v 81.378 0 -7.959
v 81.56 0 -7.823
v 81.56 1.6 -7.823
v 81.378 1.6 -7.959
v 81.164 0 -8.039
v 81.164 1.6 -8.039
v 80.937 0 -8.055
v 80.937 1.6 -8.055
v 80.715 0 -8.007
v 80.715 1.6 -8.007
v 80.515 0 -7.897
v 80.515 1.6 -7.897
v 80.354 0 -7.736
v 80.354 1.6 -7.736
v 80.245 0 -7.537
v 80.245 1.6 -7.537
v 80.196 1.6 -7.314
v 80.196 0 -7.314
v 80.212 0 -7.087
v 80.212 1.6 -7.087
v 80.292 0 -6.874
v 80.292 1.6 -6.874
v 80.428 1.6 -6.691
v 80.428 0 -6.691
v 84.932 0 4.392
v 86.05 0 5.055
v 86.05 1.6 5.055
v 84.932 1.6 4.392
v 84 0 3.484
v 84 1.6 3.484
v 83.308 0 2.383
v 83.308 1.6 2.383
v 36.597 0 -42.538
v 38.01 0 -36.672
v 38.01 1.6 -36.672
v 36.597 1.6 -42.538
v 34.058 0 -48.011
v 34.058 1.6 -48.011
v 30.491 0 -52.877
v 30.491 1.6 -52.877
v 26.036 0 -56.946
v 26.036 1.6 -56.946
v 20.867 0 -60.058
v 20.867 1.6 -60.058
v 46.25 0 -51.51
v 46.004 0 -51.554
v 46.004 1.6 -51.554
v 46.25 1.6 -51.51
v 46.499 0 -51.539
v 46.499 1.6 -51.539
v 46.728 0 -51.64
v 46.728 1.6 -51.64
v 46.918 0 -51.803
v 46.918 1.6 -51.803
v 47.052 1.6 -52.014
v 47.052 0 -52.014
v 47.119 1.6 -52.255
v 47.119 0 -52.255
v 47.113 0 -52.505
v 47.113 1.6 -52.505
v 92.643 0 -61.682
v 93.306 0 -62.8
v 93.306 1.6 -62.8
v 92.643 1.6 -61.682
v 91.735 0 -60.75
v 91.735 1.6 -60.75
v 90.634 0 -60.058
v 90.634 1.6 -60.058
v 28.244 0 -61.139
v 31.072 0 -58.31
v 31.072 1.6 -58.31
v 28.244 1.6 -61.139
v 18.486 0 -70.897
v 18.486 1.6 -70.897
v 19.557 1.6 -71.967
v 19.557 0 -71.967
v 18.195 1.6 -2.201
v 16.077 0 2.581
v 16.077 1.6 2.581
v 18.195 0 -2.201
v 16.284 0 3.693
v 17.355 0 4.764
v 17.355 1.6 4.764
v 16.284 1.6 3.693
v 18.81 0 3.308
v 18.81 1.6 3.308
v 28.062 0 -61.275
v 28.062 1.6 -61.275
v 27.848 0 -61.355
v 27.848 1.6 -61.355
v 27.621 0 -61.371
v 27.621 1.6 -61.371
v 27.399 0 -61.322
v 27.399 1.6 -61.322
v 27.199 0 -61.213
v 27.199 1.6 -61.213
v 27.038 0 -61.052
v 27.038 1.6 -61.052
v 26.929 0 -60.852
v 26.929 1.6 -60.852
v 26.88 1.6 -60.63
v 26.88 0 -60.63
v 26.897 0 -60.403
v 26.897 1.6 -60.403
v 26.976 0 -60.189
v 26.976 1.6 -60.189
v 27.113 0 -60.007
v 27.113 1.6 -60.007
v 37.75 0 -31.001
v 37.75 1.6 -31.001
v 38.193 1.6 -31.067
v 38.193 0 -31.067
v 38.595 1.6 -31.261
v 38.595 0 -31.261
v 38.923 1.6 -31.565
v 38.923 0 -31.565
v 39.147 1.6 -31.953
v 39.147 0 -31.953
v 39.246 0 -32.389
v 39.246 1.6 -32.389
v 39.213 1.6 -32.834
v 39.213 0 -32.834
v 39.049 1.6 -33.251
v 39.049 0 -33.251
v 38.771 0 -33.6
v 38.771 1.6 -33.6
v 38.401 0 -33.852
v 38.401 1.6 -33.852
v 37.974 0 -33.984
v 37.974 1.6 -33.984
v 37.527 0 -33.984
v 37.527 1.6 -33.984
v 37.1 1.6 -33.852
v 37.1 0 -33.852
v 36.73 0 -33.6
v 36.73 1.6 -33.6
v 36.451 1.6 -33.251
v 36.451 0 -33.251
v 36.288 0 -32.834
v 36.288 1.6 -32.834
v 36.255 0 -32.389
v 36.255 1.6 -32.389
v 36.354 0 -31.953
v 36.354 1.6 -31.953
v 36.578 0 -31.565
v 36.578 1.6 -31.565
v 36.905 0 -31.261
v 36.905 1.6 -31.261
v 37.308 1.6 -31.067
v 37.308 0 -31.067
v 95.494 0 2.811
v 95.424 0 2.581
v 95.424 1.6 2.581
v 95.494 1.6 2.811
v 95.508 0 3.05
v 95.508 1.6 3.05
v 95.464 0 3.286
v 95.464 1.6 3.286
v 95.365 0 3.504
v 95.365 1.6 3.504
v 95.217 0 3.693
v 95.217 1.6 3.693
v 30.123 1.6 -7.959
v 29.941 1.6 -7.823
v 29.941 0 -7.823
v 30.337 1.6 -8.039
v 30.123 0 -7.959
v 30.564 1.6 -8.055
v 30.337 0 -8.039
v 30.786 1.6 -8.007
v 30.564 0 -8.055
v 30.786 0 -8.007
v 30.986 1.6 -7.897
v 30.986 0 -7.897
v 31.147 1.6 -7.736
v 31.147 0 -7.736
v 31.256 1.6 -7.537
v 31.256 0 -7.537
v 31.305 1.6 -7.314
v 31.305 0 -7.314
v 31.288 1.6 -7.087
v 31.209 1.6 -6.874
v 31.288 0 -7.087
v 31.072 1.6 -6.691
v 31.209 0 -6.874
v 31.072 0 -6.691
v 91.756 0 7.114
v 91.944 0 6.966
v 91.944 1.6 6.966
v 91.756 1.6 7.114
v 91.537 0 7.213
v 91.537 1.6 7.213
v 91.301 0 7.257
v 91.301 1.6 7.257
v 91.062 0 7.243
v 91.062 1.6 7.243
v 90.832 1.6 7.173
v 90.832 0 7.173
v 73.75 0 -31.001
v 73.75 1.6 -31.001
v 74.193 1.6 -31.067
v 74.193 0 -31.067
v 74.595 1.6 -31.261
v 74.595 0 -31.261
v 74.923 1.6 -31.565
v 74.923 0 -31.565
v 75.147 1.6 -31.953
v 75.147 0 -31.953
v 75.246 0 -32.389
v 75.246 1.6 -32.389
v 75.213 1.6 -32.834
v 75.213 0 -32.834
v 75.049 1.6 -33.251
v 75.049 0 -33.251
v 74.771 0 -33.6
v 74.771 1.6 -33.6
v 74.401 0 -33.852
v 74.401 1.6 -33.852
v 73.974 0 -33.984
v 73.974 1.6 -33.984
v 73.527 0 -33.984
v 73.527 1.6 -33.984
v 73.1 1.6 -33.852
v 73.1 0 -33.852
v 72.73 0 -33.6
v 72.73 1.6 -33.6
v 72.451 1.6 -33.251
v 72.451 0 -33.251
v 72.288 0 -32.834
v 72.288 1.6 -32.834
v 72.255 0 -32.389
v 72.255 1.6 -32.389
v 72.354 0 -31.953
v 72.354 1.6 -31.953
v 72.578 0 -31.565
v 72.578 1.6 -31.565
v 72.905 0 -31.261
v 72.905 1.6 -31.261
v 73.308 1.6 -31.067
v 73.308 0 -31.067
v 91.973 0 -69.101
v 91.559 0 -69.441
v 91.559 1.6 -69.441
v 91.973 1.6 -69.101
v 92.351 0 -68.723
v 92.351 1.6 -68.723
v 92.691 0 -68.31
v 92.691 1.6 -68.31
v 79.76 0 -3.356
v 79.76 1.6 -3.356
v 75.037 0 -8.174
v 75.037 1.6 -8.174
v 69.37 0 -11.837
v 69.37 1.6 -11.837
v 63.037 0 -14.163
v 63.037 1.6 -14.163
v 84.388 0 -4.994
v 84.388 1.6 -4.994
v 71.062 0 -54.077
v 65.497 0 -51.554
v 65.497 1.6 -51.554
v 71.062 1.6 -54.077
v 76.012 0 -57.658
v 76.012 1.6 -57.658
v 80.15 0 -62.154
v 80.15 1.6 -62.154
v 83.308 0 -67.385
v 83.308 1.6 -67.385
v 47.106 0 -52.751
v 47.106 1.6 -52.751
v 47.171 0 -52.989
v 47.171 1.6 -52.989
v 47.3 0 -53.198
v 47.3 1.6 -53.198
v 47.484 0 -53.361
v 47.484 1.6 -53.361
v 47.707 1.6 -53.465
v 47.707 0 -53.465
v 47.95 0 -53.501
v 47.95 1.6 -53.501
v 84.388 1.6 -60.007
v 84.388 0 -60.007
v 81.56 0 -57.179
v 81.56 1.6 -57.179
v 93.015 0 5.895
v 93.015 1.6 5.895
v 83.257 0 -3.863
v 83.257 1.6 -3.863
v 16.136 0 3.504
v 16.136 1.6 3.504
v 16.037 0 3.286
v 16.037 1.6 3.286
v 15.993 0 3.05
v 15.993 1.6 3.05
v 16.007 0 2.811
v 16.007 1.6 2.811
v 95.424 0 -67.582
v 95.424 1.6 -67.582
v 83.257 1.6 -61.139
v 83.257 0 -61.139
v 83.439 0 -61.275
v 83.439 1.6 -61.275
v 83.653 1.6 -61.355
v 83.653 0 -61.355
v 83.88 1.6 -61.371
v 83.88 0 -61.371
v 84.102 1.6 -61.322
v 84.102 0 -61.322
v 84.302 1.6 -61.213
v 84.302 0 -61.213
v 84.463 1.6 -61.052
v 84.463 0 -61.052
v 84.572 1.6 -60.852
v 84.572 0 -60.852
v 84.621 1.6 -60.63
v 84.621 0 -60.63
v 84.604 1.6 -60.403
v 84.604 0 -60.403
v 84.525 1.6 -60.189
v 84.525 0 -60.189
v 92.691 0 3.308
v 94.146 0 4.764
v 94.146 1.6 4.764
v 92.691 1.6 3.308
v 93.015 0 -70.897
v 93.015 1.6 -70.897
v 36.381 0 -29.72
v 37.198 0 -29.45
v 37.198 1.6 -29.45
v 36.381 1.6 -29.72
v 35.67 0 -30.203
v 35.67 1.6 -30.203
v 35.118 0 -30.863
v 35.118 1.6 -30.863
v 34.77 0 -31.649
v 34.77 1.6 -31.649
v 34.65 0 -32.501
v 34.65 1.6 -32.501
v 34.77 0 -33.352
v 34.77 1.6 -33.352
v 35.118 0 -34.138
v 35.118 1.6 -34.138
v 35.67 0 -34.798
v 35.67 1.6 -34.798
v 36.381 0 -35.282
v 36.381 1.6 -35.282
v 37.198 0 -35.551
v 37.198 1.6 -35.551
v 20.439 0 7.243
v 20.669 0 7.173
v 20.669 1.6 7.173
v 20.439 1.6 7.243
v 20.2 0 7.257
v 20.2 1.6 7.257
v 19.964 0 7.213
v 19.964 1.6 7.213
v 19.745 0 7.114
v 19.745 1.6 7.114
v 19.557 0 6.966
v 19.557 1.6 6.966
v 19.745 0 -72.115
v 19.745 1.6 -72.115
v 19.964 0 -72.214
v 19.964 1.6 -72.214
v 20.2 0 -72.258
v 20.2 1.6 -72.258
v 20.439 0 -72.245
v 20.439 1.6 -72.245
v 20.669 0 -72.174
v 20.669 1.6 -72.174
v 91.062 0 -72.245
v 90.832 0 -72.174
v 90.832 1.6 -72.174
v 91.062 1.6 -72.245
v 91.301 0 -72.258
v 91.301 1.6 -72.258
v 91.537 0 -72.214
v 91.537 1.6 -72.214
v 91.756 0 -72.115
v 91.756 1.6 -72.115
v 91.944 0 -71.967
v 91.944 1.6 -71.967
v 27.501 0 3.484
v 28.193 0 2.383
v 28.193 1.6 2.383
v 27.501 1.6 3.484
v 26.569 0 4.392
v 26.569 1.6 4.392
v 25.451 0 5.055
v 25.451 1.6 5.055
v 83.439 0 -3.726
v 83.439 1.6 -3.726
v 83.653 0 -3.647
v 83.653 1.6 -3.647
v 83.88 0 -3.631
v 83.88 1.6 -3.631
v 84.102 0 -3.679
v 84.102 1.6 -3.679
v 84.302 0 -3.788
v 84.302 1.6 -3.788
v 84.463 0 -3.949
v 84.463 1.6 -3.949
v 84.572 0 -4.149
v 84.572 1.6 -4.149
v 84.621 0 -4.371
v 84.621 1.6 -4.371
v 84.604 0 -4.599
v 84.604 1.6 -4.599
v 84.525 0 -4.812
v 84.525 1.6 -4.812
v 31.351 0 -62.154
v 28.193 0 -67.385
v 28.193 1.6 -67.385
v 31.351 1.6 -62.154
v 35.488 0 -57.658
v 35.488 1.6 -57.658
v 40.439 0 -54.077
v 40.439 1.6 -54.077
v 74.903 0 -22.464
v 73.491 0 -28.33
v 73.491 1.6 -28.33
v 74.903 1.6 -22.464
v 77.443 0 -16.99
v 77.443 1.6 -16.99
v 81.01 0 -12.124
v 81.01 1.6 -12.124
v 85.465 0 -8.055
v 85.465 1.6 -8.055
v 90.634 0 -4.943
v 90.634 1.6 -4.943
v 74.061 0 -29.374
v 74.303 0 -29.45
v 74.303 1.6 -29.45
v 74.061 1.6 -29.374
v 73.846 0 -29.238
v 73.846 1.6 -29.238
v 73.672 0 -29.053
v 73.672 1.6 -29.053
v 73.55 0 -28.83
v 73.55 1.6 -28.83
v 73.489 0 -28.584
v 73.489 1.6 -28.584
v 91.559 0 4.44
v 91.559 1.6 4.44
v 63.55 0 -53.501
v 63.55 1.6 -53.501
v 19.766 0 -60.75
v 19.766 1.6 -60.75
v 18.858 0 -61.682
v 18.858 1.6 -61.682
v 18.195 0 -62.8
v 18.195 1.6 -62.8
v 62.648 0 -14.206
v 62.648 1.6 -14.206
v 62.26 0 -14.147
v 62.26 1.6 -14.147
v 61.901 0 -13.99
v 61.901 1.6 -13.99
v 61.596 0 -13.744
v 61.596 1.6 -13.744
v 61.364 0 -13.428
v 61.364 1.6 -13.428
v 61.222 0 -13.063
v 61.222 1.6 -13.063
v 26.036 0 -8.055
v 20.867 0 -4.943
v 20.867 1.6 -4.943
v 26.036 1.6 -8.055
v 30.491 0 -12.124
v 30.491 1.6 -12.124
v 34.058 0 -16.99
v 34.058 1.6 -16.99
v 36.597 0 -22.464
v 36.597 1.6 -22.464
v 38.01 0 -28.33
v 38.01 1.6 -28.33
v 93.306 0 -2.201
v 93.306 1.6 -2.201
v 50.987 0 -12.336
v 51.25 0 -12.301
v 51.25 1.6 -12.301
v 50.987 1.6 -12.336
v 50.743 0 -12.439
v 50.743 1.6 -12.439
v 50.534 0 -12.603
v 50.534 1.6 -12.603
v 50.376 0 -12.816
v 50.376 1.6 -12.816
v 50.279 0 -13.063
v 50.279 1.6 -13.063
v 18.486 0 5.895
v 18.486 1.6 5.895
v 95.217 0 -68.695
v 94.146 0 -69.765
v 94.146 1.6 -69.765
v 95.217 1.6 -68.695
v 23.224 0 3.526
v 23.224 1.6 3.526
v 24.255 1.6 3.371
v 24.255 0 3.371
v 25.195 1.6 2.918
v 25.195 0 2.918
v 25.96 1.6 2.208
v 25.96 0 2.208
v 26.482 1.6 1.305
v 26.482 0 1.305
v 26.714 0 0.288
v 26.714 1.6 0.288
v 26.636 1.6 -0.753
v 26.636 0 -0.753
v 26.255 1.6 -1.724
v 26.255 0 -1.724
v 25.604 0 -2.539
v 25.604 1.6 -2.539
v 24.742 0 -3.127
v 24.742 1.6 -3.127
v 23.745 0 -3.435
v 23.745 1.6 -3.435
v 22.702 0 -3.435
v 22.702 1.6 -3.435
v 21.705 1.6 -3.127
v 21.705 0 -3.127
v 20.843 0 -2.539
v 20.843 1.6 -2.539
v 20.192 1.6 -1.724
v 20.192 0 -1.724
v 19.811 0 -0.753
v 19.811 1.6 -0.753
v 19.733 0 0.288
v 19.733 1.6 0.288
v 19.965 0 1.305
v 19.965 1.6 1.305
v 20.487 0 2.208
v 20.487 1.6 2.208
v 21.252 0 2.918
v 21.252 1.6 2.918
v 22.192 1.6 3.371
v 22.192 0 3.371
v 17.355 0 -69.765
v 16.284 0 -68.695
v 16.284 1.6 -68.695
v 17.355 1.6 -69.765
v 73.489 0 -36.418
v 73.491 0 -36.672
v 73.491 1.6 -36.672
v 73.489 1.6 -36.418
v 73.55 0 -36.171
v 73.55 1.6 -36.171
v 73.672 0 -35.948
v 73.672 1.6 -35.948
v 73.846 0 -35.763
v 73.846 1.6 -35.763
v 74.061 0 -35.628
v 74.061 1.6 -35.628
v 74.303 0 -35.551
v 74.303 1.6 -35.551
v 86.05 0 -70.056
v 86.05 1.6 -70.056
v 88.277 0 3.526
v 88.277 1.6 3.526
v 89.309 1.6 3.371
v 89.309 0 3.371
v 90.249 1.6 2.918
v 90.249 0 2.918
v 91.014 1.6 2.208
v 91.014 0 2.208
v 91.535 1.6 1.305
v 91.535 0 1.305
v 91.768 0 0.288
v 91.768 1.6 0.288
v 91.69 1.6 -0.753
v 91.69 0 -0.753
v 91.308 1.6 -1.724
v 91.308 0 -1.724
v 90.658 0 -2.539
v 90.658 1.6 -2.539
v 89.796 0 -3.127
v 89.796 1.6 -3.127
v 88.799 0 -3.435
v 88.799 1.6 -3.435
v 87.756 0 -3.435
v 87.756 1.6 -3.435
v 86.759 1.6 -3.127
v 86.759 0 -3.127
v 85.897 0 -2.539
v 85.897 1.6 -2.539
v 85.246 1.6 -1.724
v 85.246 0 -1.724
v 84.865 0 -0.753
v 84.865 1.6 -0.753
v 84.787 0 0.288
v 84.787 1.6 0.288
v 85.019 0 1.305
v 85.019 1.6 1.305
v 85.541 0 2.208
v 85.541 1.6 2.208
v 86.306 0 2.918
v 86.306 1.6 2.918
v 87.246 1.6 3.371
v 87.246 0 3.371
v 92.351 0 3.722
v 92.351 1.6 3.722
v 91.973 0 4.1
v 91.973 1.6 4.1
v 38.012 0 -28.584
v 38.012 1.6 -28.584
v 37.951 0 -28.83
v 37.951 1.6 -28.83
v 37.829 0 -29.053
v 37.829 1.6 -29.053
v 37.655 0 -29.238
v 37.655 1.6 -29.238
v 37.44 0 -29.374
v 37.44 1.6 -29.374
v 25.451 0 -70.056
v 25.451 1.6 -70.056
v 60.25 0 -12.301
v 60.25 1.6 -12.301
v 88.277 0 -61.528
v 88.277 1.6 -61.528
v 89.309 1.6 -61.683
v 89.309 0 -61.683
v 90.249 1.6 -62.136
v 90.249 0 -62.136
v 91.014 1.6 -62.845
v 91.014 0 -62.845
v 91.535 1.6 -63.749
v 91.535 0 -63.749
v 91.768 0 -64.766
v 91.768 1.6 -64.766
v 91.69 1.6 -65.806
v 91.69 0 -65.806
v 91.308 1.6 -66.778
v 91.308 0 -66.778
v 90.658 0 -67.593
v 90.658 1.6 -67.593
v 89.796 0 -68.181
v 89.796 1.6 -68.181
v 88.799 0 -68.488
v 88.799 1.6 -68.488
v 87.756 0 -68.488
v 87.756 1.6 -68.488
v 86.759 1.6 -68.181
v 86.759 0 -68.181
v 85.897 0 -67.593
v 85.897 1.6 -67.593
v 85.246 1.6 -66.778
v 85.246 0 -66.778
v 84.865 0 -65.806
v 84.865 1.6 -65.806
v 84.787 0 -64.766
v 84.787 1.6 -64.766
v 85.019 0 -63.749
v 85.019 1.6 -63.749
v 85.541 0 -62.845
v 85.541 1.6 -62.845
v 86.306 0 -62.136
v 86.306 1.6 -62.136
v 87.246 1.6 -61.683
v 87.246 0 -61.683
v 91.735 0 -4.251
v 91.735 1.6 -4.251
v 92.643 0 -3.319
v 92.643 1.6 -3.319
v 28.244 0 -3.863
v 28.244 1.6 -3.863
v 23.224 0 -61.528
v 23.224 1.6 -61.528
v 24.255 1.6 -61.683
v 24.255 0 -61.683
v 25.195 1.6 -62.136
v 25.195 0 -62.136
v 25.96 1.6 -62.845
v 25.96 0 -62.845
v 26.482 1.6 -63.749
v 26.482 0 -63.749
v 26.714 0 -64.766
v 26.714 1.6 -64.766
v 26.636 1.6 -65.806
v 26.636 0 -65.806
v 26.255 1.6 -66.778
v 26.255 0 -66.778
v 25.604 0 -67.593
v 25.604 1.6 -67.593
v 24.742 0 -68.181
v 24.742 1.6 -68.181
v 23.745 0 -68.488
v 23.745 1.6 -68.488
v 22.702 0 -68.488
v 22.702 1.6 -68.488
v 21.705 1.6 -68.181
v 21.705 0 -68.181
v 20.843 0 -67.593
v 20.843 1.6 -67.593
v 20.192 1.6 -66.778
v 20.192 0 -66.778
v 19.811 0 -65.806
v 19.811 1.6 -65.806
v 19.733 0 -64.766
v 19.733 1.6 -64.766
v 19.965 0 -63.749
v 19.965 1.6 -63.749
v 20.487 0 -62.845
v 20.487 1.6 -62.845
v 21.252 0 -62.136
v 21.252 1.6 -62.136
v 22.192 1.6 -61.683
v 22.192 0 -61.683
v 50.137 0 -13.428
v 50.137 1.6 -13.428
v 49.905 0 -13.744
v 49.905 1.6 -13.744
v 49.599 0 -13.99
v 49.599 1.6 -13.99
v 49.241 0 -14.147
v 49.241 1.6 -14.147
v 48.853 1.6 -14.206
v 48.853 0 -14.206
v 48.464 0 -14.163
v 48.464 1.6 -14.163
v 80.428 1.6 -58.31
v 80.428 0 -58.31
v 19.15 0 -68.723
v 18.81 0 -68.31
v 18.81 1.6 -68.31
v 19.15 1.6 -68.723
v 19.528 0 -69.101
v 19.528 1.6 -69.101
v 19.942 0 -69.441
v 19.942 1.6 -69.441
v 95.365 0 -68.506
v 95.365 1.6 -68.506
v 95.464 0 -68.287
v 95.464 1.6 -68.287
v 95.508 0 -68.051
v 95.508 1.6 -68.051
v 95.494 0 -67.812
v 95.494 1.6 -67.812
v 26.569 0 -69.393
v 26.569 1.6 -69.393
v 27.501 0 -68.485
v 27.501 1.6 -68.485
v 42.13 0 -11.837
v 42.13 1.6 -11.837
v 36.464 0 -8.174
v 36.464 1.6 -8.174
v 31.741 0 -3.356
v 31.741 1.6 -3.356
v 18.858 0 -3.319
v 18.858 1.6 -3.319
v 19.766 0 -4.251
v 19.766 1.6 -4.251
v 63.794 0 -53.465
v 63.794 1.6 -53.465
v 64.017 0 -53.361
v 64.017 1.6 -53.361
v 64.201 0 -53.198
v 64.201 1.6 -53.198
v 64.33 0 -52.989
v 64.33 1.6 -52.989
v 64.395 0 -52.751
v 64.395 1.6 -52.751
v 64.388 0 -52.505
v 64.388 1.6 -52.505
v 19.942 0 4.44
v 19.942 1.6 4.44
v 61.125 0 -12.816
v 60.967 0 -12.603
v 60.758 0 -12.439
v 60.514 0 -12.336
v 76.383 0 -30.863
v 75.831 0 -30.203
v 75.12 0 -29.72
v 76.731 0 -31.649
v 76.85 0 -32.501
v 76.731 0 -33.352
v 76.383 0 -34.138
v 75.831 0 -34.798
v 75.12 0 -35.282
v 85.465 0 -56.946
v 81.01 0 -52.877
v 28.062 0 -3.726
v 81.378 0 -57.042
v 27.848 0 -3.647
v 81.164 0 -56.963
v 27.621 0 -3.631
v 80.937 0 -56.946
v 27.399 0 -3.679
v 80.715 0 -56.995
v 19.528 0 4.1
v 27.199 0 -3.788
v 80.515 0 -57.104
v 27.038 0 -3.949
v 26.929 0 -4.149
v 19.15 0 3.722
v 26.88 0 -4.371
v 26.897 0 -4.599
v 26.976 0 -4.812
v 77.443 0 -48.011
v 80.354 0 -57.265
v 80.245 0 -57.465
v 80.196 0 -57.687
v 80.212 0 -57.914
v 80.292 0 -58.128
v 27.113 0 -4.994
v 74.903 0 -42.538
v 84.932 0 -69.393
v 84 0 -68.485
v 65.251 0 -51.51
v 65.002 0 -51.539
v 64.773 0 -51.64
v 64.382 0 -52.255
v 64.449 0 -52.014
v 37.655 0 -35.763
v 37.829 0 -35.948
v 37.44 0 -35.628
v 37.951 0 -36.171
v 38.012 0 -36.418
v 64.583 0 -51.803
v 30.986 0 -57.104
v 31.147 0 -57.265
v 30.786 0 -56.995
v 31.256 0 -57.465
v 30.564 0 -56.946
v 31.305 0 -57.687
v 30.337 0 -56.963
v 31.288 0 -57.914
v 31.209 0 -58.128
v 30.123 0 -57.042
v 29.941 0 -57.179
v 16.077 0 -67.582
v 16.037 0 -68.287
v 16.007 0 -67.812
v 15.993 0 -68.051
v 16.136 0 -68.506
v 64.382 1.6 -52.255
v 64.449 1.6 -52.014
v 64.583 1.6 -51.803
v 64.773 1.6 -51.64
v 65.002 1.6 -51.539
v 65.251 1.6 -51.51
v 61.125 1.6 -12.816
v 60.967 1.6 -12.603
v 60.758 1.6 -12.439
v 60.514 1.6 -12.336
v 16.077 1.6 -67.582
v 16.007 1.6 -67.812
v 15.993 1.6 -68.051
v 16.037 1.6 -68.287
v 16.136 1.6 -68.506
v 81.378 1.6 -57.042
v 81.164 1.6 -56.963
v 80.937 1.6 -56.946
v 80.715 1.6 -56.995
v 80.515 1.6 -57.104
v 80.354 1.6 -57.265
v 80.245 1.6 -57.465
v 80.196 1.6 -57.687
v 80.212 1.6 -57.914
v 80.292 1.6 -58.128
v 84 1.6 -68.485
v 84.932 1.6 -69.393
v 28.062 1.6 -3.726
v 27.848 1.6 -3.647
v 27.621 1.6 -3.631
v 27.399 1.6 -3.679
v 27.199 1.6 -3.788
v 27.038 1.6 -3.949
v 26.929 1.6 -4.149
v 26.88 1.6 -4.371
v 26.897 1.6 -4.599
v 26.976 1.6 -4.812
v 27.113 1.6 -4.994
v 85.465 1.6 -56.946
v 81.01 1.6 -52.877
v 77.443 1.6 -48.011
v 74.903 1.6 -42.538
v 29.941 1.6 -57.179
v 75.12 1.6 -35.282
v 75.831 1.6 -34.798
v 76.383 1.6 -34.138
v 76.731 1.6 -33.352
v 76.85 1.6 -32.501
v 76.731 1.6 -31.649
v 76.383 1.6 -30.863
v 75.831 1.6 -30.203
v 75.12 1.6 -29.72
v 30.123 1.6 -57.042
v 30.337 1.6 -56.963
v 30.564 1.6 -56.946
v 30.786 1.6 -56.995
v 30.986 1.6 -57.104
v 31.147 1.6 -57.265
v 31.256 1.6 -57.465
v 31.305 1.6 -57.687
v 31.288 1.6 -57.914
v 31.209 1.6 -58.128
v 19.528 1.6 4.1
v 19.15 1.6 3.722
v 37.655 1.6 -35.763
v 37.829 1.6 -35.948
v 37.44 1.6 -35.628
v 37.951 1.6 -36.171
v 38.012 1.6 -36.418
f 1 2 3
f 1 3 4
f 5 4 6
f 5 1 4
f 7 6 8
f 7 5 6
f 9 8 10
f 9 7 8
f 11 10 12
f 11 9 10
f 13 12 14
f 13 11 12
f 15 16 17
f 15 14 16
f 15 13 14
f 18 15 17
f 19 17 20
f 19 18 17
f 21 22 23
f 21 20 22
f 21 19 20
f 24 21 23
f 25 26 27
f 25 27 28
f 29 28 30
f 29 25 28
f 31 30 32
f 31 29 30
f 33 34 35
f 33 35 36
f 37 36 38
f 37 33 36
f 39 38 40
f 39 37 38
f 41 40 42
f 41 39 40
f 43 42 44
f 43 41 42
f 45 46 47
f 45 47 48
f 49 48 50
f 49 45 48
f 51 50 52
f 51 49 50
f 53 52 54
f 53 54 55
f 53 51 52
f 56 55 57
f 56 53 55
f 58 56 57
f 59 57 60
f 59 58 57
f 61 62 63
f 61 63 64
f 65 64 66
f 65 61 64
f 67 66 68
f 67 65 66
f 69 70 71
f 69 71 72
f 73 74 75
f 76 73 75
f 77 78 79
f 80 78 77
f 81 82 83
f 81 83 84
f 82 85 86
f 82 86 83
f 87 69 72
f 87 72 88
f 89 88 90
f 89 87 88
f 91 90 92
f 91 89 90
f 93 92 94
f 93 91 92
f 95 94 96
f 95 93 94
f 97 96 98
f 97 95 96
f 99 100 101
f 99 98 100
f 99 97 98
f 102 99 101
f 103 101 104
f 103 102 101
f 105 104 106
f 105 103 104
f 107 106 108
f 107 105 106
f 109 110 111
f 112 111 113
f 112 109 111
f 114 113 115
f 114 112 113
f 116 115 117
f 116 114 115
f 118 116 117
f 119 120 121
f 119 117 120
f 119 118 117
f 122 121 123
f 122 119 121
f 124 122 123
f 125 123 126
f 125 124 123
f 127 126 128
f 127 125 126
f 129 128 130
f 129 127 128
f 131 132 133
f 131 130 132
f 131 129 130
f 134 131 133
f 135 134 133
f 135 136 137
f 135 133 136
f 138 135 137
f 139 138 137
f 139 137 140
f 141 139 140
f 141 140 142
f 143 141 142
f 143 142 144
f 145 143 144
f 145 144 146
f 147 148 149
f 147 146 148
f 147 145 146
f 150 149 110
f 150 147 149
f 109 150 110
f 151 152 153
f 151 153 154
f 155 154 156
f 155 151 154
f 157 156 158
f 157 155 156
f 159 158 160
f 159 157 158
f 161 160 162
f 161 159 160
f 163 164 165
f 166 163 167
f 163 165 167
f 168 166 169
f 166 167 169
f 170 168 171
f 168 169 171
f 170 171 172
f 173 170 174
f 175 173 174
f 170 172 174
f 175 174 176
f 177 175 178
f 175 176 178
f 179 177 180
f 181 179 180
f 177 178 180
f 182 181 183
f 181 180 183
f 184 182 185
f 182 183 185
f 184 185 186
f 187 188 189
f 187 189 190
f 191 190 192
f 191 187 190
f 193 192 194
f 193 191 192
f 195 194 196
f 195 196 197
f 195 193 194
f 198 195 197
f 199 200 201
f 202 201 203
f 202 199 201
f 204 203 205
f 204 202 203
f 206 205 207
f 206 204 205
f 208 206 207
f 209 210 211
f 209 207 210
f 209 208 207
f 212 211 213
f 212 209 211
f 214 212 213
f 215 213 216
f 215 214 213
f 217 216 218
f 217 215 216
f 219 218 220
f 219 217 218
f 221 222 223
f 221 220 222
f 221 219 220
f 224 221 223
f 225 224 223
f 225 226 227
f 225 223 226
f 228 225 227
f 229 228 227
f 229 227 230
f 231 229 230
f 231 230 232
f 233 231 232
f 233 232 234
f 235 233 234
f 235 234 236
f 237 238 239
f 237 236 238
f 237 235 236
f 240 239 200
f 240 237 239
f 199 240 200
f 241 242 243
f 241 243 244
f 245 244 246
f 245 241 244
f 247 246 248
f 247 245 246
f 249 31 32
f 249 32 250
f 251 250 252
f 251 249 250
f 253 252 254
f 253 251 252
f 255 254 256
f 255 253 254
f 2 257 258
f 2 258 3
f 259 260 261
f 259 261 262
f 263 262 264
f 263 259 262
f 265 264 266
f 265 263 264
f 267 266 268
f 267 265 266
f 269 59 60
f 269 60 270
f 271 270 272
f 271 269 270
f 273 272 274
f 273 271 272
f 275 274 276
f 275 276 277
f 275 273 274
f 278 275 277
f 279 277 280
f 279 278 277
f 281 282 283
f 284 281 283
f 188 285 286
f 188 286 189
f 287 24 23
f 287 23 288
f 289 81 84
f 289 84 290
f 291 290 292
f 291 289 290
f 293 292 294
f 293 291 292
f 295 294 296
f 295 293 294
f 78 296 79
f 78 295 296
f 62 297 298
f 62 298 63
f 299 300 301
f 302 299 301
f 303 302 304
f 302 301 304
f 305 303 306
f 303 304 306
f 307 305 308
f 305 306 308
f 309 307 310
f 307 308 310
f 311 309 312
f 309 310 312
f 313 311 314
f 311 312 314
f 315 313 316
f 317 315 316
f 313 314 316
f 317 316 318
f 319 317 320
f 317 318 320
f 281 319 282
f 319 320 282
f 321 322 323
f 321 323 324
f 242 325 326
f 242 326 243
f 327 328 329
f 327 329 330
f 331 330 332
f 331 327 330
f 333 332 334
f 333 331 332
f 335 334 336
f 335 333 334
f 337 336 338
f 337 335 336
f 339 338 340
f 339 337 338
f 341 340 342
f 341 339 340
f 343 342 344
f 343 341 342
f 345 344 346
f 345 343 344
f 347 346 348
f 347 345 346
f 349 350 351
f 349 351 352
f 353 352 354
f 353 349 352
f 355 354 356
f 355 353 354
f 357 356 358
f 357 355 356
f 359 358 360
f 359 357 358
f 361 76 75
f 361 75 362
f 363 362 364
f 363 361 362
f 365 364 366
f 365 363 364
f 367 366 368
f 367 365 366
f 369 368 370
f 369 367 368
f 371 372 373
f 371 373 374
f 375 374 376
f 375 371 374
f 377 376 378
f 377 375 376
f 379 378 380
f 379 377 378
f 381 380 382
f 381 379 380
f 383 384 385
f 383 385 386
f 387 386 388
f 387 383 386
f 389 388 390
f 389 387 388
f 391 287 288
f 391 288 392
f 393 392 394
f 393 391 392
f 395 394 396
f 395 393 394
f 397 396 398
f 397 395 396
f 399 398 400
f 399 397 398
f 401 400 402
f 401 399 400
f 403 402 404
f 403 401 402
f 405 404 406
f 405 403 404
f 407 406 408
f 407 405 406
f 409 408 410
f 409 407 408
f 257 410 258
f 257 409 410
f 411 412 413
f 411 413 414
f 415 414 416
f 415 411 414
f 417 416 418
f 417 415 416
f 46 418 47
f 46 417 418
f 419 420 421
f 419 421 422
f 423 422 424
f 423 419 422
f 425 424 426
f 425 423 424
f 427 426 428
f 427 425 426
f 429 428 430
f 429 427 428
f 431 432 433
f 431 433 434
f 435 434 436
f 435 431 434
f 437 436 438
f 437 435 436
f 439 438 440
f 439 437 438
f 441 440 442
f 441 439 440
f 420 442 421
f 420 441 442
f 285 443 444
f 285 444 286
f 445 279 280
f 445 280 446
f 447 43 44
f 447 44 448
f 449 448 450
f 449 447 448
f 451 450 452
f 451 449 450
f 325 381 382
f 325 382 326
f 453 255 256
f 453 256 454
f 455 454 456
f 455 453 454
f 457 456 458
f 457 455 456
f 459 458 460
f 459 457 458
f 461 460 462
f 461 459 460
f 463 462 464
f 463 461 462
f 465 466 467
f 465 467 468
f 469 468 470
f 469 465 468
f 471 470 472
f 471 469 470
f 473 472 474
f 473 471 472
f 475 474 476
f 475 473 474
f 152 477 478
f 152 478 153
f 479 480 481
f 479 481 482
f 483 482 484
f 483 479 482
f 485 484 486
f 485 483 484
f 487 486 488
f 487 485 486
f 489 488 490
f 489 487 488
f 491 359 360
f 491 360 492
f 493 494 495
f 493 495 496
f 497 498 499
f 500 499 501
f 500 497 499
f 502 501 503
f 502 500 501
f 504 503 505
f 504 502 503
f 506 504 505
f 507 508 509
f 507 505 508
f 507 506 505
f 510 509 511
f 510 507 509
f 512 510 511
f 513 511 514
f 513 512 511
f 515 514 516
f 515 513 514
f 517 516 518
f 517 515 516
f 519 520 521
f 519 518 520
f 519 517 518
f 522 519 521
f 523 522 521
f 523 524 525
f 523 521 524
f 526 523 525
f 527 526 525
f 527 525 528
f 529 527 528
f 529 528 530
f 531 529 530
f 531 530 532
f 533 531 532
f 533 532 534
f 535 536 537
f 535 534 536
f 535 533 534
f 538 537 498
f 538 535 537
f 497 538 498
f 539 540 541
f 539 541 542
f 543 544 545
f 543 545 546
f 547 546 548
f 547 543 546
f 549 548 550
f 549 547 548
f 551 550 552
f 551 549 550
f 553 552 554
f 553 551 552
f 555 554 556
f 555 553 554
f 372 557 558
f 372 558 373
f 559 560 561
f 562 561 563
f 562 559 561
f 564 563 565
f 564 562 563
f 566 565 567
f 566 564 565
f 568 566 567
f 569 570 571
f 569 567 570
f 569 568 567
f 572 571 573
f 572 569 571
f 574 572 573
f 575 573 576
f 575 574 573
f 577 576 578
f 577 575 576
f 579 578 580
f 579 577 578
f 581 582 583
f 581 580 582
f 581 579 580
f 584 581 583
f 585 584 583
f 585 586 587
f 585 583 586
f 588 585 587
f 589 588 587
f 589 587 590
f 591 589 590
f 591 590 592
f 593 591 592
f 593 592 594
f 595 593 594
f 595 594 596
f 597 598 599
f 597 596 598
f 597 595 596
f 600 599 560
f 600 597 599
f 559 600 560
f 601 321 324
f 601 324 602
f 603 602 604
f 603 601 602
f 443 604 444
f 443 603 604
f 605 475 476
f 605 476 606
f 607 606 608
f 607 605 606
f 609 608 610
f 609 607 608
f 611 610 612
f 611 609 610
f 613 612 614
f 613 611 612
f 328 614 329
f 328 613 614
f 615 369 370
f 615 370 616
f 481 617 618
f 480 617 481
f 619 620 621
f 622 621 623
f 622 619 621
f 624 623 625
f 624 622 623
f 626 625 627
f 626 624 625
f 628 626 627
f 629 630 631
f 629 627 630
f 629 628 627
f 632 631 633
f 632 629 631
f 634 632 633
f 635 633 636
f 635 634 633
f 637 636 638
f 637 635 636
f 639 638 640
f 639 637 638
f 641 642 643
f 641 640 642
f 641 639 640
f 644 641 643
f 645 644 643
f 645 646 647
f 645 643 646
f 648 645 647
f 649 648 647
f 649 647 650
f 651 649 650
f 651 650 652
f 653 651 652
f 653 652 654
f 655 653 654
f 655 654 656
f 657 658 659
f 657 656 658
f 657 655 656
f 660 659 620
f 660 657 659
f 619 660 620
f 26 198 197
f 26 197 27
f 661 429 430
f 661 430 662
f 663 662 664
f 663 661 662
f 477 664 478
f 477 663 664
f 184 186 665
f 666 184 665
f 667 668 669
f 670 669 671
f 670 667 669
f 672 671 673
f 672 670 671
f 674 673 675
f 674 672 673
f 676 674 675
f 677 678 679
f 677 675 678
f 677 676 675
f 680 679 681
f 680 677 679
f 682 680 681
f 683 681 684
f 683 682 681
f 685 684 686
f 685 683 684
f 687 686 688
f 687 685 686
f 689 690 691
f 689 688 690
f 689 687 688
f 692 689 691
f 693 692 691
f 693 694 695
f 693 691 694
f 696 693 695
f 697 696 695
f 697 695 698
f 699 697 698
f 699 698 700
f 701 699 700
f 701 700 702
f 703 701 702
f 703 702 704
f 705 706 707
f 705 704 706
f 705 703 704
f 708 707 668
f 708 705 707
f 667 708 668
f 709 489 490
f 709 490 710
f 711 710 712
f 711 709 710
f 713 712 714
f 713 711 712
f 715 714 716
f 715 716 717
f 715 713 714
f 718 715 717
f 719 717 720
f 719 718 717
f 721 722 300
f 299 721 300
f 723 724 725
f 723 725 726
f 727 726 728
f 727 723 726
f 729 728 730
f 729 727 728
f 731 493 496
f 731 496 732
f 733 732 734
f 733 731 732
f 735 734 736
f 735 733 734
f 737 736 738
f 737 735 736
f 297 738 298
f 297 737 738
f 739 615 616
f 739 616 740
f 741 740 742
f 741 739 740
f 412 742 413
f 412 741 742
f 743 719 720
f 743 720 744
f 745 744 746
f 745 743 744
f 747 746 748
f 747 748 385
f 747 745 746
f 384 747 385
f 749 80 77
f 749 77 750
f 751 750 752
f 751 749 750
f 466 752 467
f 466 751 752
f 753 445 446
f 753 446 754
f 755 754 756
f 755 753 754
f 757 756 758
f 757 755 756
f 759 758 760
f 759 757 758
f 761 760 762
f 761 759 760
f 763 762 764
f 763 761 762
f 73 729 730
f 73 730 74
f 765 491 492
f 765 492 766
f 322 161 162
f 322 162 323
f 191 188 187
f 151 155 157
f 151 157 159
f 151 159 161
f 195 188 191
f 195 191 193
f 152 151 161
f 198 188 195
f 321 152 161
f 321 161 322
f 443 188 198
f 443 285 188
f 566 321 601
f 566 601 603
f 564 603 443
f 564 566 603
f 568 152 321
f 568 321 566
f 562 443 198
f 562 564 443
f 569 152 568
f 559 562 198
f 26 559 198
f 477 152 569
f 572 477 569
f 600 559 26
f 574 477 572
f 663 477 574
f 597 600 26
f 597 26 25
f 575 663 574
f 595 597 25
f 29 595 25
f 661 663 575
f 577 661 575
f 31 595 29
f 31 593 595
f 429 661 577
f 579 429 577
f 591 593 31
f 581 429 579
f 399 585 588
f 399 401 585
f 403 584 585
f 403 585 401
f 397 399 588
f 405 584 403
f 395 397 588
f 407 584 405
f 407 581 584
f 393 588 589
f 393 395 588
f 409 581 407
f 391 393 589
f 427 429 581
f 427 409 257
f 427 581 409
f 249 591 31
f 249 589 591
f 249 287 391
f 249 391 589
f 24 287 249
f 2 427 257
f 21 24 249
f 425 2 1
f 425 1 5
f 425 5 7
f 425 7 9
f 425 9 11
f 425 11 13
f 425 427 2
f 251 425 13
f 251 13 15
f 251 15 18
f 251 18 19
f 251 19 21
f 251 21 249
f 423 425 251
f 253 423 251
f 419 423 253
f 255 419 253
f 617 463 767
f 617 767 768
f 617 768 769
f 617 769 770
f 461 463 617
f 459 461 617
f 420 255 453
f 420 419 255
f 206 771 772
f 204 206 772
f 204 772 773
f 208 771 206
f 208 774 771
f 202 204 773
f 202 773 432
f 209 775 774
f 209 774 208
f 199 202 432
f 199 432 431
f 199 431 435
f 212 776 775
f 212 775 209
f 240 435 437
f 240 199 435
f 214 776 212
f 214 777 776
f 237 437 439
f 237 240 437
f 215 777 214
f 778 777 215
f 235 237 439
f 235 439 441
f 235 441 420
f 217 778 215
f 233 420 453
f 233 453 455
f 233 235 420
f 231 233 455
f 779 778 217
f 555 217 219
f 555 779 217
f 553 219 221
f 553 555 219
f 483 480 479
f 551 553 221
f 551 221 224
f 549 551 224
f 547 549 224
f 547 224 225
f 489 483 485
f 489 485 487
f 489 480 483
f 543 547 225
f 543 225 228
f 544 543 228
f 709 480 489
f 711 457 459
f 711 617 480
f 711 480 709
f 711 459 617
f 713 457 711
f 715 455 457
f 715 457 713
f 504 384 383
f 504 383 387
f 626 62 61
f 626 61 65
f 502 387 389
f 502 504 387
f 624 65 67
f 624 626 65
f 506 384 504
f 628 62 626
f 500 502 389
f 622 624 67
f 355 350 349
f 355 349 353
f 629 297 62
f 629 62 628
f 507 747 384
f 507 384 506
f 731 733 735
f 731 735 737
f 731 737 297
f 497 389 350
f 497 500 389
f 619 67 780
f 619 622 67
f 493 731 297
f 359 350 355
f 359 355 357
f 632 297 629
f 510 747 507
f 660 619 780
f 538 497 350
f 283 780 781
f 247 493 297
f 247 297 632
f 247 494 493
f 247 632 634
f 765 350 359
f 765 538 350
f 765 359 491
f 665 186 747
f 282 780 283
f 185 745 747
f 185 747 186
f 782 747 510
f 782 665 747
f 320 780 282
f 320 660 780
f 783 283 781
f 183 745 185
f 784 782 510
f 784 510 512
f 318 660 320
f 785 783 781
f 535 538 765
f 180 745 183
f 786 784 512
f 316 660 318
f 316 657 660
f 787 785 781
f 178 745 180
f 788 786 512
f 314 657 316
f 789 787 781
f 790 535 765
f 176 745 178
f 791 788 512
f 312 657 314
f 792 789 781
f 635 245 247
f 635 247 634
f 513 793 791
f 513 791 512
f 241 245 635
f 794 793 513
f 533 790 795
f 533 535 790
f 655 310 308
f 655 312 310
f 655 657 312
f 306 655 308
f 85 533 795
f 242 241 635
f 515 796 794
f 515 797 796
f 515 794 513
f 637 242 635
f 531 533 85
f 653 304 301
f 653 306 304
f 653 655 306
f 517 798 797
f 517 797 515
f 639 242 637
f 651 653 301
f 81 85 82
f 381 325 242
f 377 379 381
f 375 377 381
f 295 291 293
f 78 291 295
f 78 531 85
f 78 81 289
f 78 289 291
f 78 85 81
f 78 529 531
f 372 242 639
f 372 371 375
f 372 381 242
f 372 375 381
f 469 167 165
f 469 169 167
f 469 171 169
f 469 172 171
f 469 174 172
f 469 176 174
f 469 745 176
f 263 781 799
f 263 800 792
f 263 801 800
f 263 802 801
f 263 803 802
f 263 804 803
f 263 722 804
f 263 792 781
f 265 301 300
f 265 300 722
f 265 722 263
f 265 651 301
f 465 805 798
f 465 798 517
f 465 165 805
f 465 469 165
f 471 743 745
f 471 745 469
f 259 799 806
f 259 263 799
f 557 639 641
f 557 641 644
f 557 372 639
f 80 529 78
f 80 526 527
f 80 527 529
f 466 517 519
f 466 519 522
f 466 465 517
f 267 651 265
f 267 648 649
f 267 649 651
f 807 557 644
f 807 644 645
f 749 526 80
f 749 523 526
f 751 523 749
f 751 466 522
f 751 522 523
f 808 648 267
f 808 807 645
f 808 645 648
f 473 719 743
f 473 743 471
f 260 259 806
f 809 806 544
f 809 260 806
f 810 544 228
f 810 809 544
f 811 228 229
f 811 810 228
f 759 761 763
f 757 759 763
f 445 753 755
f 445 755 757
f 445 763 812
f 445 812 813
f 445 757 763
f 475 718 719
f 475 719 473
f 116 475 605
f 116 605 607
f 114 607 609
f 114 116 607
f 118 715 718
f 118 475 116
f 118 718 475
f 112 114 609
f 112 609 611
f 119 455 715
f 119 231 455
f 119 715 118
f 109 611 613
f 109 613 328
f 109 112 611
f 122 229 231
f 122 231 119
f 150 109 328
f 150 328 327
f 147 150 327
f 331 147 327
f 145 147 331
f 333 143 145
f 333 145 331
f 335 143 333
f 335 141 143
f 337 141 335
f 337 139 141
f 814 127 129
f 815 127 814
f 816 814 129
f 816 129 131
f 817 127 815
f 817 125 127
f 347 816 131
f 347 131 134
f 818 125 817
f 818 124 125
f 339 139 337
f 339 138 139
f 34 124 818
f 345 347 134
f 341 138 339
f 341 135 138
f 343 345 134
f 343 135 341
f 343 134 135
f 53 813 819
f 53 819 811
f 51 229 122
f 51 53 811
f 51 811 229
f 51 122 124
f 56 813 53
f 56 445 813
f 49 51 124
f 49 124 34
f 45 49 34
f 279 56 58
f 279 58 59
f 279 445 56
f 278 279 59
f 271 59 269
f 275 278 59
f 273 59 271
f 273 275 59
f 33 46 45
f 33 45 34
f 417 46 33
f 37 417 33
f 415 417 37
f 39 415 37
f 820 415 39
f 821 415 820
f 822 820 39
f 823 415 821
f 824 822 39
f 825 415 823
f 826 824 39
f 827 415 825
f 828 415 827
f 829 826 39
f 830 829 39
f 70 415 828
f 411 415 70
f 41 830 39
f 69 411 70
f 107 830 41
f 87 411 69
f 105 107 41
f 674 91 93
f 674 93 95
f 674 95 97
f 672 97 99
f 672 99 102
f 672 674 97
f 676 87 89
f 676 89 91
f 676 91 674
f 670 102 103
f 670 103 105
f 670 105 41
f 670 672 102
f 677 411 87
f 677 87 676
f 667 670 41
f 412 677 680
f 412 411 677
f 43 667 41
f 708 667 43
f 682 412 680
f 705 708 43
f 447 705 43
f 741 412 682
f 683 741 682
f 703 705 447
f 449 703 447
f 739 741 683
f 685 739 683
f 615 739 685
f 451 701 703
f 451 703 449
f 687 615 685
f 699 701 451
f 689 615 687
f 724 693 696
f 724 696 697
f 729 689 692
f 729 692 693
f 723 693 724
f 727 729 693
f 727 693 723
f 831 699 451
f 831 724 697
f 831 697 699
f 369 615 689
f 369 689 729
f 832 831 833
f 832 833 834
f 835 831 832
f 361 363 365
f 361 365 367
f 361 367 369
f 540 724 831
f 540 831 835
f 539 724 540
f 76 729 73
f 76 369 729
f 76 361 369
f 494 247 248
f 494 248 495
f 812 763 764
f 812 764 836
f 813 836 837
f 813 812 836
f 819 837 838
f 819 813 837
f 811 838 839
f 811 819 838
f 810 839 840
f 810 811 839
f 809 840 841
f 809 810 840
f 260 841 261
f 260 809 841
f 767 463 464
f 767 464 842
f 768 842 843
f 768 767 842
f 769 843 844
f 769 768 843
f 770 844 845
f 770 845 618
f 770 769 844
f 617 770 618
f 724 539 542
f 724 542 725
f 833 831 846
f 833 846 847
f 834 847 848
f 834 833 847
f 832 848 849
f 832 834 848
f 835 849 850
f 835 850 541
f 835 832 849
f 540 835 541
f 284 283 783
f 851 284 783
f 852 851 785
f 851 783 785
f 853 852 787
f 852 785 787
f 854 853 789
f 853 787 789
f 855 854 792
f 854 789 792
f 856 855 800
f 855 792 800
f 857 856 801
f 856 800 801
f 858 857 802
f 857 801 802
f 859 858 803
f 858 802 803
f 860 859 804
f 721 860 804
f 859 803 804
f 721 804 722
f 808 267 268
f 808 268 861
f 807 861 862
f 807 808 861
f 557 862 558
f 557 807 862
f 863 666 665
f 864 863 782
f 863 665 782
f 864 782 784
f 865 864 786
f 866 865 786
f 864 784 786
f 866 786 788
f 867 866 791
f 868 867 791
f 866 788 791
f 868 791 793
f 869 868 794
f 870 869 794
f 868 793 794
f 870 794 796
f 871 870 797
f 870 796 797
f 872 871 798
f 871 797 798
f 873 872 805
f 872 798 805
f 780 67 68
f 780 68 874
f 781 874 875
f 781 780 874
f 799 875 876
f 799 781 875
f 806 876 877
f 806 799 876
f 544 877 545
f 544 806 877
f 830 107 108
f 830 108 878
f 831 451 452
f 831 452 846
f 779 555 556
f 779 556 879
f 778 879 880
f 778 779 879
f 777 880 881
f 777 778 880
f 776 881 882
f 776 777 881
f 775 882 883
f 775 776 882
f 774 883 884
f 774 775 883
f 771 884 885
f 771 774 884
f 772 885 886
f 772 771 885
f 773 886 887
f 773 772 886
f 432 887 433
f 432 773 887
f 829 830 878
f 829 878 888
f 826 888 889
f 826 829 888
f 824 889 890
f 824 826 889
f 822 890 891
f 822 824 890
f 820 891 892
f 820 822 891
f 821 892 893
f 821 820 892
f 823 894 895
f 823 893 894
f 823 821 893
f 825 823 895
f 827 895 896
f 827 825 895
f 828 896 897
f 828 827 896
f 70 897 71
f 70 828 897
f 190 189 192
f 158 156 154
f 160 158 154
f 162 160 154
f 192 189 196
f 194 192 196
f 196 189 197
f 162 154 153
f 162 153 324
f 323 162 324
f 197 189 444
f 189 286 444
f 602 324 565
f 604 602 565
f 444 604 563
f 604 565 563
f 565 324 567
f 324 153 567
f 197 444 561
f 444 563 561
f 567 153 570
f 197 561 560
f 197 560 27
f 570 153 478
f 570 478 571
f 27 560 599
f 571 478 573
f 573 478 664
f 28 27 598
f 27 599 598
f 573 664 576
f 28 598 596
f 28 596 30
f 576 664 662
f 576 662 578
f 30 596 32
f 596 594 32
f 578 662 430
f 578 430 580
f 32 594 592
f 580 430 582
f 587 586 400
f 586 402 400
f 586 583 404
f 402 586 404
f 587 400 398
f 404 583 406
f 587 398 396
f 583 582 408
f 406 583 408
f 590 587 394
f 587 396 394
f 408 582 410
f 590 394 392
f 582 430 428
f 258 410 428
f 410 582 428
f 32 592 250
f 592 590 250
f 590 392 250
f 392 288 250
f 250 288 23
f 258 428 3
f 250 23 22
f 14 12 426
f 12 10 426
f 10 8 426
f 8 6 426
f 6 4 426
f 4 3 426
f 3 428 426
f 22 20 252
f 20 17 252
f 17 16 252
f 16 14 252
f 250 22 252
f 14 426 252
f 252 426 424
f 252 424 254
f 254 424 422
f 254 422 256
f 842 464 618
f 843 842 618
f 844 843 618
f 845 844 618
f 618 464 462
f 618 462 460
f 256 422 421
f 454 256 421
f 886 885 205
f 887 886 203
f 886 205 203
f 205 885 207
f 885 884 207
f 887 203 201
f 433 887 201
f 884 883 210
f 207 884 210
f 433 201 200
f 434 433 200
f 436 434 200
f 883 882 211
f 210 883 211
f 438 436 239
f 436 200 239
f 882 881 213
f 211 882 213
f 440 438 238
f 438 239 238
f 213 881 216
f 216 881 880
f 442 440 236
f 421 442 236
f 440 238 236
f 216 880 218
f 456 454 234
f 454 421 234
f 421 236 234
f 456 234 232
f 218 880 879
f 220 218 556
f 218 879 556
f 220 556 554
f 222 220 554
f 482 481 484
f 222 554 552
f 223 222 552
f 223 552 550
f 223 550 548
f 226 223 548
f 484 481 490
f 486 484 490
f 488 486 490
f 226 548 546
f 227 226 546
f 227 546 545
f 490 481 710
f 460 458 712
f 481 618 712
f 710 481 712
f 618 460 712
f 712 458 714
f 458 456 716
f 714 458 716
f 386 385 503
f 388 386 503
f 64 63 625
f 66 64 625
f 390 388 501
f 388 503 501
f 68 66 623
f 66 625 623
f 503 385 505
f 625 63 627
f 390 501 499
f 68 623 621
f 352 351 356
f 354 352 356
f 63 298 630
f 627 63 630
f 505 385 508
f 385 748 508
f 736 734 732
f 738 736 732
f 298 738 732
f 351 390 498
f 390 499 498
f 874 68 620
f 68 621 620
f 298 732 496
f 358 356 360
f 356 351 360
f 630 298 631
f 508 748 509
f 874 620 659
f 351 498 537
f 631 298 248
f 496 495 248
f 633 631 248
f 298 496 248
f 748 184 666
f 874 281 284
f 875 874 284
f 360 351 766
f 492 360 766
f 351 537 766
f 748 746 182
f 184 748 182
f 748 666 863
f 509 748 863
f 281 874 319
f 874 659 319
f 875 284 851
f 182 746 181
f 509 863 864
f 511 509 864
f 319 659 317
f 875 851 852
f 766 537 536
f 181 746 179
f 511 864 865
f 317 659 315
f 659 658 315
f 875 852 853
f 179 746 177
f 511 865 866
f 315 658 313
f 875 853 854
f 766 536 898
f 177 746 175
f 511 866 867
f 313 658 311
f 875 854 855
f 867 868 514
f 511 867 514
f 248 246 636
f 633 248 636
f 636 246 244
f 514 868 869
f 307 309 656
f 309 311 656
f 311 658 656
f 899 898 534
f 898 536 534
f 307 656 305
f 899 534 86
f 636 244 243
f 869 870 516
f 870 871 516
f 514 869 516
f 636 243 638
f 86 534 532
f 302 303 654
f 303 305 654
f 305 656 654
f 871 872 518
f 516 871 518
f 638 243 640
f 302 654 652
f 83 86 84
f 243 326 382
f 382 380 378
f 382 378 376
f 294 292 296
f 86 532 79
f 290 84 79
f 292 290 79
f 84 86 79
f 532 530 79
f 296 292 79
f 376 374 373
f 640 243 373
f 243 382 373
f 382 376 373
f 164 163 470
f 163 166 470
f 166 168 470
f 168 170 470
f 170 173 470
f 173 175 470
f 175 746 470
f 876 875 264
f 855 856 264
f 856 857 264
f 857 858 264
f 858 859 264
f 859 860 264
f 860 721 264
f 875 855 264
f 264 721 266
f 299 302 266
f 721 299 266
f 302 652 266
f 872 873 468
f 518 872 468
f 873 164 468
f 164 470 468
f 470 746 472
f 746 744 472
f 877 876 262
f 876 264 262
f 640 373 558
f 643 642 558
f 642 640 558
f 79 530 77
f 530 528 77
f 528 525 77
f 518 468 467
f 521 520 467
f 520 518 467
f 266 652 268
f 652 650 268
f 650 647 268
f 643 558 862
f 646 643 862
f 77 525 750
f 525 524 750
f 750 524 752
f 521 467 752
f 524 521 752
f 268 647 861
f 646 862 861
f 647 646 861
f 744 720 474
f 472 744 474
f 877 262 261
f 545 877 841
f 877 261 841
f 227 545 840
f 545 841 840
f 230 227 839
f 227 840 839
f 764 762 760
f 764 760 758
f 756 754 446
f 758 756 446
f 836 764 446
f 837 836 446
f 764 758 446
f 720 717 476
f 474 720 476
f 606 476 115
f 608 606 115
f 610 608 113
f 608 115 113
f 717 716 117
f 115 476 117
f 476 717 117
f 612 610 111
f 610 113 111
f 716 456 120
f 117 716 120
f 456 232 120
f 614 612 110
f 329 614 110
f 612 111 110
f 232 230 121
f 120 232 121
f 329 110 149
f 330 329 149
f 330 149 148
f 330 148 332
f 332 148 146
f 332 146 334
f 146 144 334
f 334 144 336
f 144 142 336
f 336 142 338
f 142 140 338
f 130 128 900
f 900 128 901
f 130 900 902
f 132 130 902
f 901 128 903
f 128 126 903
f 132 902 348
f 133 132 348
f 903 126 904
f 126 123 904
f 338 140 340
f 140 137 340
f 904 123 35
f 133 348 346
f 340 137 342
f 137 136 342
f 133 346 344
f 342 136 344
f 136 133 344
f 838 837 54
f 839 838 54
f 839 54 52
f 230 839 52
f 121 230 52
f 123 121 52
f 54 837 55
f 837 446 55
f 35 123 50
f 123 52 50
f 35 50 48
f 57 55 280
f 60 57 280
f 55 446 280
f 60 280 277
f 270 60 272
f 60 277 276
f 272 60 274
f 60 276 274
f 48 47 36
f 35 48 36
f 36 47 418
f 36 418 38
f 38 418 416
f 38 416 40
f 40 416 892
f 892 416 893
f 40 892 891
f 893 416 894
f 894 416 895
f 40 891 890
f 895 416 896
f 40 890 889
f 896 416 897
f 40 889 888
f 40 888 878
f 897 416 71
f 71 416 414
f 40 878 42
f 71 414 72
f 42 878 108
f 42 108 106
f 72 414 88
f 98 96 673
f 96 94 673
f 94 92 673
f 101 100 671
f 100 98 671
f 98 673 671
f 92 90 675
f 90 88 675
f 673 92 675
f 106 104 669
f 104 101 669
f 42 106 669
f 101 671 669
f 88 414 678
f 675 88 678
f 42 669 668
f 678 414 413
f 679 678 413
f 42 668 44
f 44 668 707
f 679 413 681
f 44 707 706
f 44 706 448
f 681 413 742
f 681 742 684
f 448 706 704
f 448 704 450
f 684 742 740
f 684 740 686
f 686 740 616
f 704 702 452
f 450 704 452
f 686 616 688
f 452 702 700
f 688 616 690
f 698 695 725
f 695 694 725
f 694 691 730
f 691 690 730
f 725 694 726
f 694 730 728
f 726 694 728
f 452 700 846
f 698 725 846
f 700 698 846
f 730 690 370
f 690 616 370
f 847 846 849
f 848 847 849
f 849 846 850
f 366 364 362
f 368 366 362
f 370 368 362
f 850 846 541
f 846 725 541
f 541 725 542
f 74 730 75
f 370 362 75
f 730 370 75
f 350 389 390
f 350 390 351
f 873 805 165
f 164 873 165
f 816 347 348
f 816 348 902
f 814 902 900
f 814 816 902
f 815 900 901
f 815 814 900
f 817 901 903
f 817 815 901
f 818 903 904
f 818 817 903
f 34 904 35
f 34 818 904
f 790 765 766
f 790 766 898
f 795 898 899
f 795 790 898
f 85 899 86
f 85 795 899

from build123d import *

# Parameters (mm, degrees)
EXTRUDE_1_DEPTH     = 1.6
SKETCH_2_R          = 3.5
SKETCH_2_R_2        = 1.5
CUT_EXTRUDE_2_DEPTH = 120.775748848


with BuildPart() as part:
    # 草图1 → 凸台-拉伸1 (new body)
    with BuildSketch(Plane(origin=(0, 0, 0), x_dir=(1, 0, 0), z_dir=(0, 1, 0))):
        with BuildLine():
            Line((47.950455462, 53.500678068), (63.550455462, 53.500678068))
            ThreePointArc((63.550455462, 53.500678068), (64.200939835, 53.197825288), (64.387892442, 52.505078257))
            ThreePointArc((64.387892442, 52.505078257), (64.672019835, 51.714227719), (65.496953127, 51.554046536))
            ThreePointArc((65.496953127, 51.554046536), (76.012452894, 57.657876981), (83.307978073, 67.384530764))
            ThreePointArc((83.307978073, 67.384530764), (84.439034072, 68.966777391), (86.050077403, 70.056424786))
            Line((86.050077403, 70.056424786), (90.83225012, 72.174467215))
            ThreePointArc((90.83225012, 72.174467215), (91.420402092, 72.243211116), (91.944318718, 71.967240399))
            Line((91.944318718, 71.967240399), (93.014982831, 70.896576286))
            Line((93.014982831, 70.896576286), (91.559408573, 69.441002029))
            ThreePointArc((91.559408573, 69.441002029), (92.166454693, 68.916677299), (92.690779423, 68.309631179))
            Line((92.690779423, 68.309631179), (94.146353681, 69.765205436))
            Line((94.146353681, 69.765205436), (95.217017793, 68.694541323))
            ThreePointArc((95.217017793, 68.694541323), (95.49298851, 68.170624698), (95.424244609, 67.582472725))
            Line((95.424244609, 67.582472725), (93.306202181, 62.800300009))
            ThreePointArc((93.306202181, 62.800300009), (92.216554786, 61.189256677), (90.634308158, 60.058200679))
            ThreePointArc((90.634308158, 60.058200679), (79.105768954, 50.532503354), (73.491163469, 36.671683358))
            ThreePointArc((73.491163469, 36.671683358), (73.672060349, 35.948096267), (74.303399444, 35.550965423))
            ThreePointArc((74.303399444, 35.550965423), (76.850455462, 32.500678068), (74.303399444, 29.450390712))
            ThreePointArc((74.303399444, 29.450390712), (73.672060349, 29.053259868), (73.491163469, 28.329672777))
            ThreePointArc((73.491163469, 28.329672777), (79.105768724, 14.468853095), (90.634307454, 4.94315579))
            ThreePointArc((90.634307454, 4.94315579), (92.216554514, 3.812099737), (93.306202181, 2.201056127))
            Line((93.306202181, 2.201056127), (95.424244609, -2.58111659))
            ThreePointArc((95.424244609, -2.58111659), (95.49298851, -3.169268563), (95.217017793, -3.693185188))
            Line((95.217017793, -3.693185188), (94.146353681, -4.763849301))
            Line((94.146353681, -4.763849301), (92.690779423, -3.308275044))
            ThreePointArc((92.690779423, -3.308275044), (92.166454693, -3.915321163), (91.559408573, -4.439645893))
            Line((91.559408573, -4.439645893), (93.014982831, -5.895220151))
            Line((93.014982831, -5.895220151), (91.944318718, -6.965884264))
            ThreePointArc((91.944318718, -6.965884264), (91.420402092, -7.24185498), (90.83225012, -7.173111079))
            Line((90.83225012, -7.173111079), (86.050077403, -5.055068651))
            ThreePointArc((86.050077403, -5.055068651), (84.439034072, -3.965421256), (83.307978073, -2.383174628))
            ThreePointArc((83.307978073, -2.383174628), (75.037180063, 8.17430315), (63.037239962, 14.163282556))
            ThreePointArc((63.037239962, 14.163282556), (61.901454693, 13.989537546), (61.221822682, 13.063094977))
            ThreePointArc((61.221822682, 13.063094977), (60.867876271, 12.514045024), (60.250455462, 12.300678068))
            Line((60.250455462, 12.300678068), (51.250455462, 12.300678068))
            ThreePointArc((51.250455462, 12.300678068), (50.633034654, 12.514045024), (50.279088243, 13.063094977))
            ThreePointArc((50.279088243, 13.063094977), (49.599456231, 13.989537546), (48.463670963, 14.163282556))
            ThreePointArc((48.463670963, 14.163282556), (36.463730861, 8.17430315), (28.192932851, -2.383174628))
            ThreePointArc((28.192932851, -2.383174628), (27.061876853, -3.965421256), (25.450833521, -5.055068651))
            Line((25.450833521, -5.055068651), (20.668660805, -7.173111079))
            ThreePointArc((20.668660805, -7.173111079), (20.080508832, -7.24185498), (19.556592206, -6.965884264))
            Line((19.556592206, -6.965884264), (18.485928094, -5.895220151))
            Line((18.485928094, -5.895220151), (19.941502351, -4.439645893))
            ThreePointArc((19.941502351, -4.439645893), (19.334456231, -3.915321163), (18.810131501, -3.308275044))
            Line((18.810131501, -3.308275044), (17.354557244, -4.763849301))
            Line((17.354557244, -4.763849301), (16.283893131, -3.693185188))
            ThreePointArc((16.283893131, -3.693185188), (16.007922414, -3.169268563), (16.076666315, -2.58111659))
            Line((16.076666315, -2.58111659), (18.194708744, 2.201056127))
            ThreePointArc((18.194708744, 2.201056127), (19.28435641, 3.812099737), (20.86660347, 4.94315579))
            ThreePointArc((20.86660347, 4.94315579), (32.395142201, 14.468853095), (38.009747455, 28.329672777))
            ThreePointArc((38.009747455, 28.329672777), (37.828850575, 29.053259868), (37.19751148, 29.450390712))
            ThreePointArc((37.19751148, 29.450390712), (34.650455462, 32.500678068), (37.19751148, 35.550965423))
            ThreePointArc((37.19751148, 35.550965423), (37.828850575, 35.948096267), (38.009747455, 36.671683358))
            ThreePointArc((38.009747455, 36.671683358), (32.39514197, 50.532503354), (20.866602766, 60.058200679))
            ThreePointArc((20.866602766, 60.058200679), (19.284356139, 61.189256677), (18.194708744, 62.800300009))
            Line((18.194708744, 62.800300009), (16.076666315, 67.582472725))
            ThreePointArc((16.076666315, 67.582472725), (16.007922414, 68.170624698), (16.283893131, 68.694541323))
            Line((16.283893131, 68.694541323), (17.354557244, 69.765205436))
            Line((17.354557244, 69.765205436), (18.810131501, 68.309631179))
            ThreePointArc((18.810131501, 68.309631179), (19.334456231, 68.916677299), (19.941502351, 69.441002029))
            Line((19.941502351, 69.441002029), (18.485928094, 70.896576286))
            Line((18.485928094, 70.896576286), (19.556592206, 71.967240399))
            ThreePointArc((19.556592206, 71.967240399), (20.080508832, 72.243211116), (20.668660805, 72.174467215))
            Line((20.668660805, 72.174467215), (25.450833521, 70.056424786))
            ThreePointArc((25.450833521, 70.056424786), (27.061876853, 68.966777391), (28.192932851, 67.384530764))
            ThreePointArc((28.192932851, 67.384530764), (35.488458031, 57.657876981), (46.003957797, 51.554046536))
            ThreePointArc((46.003957797, 51.554046536), (46.82889109, 51.714227719), (47.113018482, 52.505078257))
            ThreePointArc((47.113018482, 52.505078257), (47.299971089, 53.197825288), (47.950455462, 53.500678068))
        make_face()
    extrude(amount=EXTRUDE_1_DEPTH)

    # 草图2 → 切除-拉伸2 (cut, through all)
    with BuildSketch(Plane(origin=(0, 0, 0), x_dir=(1, 0, 0), z_dir=(0, 1, 0))):
        with Locations(Location((88.277367397, -0.026233867, 0), (0, 0, 270))):
            Circle(SKETCH_2_R)
        with Locations(Location((88.277367397, 65.027590002, 0), (0, 0, 270))):
            Circle(SKETCH_2_R)
        with Locations(Location((23.223543528, -0.026233867, 0), (0, 0, 270))):
            Circle(SKETCH_2_R)
        with Locations(Location((23.223543528, 65.027590002, 0), (0, 0, 270))):
            Circle(SKETCH_2_R)
        with Locations(Location((37.750455462, 32.500678068, 0), (0, 0, 270))):
            Circle(SKETCH_2_R_2)
        with Locations(Location((73.750455462, 32.500678068, 0), (0, 0, 270))):
            Circle(SKETCH_2_R_2)
        with BuildLine():
            Line((84.3882801, 4.994224279), (81.559852975, 7.822651404))
            ThreePointArc((81.559852975, 7.822651404), (80.428482126, 7.822651404), (80.428482126, 6.691280554))
            Line((80.428482126, 6.691280554), (83.25690925, 3.86285343))
            ThreePointArc((83.25690925, 3.86285343), (84.3882801, 3.86285343), (84.3882801, 4.994224279))
        make_face()
        with BuildLine():
            Line((27.112630824, 60.007131856), (29.941057949, 57.178704731))
            ThreePointArc((29.941057949, 57.178704731), (31.072428799, 57.178704731), (31.072428799, 58.310075581))
            Line((31.072428799, 58.310075581), (28.244001674, 61.138502706))
            ThreePointArc((28.244001674, 61.138502706), (27.112630824, 61.138502706), (27.112630824, 60.007131856))
        make_face()
        with BuildLine():
            Line((27.112630824, 4.994224279), (29.941057949, 7.822651404))
            ThreePointArc((29.941057949, 7.822651404), (31.072428799, 7.822651404), (31.072428799, 6.691280554))
            Line((31.072428799, 6.691280554), (28.244001674, 3.86285343))
            ThreePointArc((28.244001674, 3.86285343), (27.112630824, 3.86285343), (27.112630824, 4.994224279))
        make_face()
        with BuildLine():
            Line((84.3882801, 60.007131856), (81.559852975, 57.178704731))
            ThreePointArc((81.559852975, 57.178704731), (80.428482126, 57.178704731), (80.428482126, 58.310075581))
            Line((80.428482126, 58.310075581), (83.25690925, 61.138502706))
            ThreePointArc((83.25690925, 61.138502706), (84.3882801, 61.138502706), (84.3882801, 60.007131856))
        make_face()
    extrude(amount=CUT_EXTRUDE_2_DEPTH, mode=Mode.SUBTRACT)


solid = part.part
